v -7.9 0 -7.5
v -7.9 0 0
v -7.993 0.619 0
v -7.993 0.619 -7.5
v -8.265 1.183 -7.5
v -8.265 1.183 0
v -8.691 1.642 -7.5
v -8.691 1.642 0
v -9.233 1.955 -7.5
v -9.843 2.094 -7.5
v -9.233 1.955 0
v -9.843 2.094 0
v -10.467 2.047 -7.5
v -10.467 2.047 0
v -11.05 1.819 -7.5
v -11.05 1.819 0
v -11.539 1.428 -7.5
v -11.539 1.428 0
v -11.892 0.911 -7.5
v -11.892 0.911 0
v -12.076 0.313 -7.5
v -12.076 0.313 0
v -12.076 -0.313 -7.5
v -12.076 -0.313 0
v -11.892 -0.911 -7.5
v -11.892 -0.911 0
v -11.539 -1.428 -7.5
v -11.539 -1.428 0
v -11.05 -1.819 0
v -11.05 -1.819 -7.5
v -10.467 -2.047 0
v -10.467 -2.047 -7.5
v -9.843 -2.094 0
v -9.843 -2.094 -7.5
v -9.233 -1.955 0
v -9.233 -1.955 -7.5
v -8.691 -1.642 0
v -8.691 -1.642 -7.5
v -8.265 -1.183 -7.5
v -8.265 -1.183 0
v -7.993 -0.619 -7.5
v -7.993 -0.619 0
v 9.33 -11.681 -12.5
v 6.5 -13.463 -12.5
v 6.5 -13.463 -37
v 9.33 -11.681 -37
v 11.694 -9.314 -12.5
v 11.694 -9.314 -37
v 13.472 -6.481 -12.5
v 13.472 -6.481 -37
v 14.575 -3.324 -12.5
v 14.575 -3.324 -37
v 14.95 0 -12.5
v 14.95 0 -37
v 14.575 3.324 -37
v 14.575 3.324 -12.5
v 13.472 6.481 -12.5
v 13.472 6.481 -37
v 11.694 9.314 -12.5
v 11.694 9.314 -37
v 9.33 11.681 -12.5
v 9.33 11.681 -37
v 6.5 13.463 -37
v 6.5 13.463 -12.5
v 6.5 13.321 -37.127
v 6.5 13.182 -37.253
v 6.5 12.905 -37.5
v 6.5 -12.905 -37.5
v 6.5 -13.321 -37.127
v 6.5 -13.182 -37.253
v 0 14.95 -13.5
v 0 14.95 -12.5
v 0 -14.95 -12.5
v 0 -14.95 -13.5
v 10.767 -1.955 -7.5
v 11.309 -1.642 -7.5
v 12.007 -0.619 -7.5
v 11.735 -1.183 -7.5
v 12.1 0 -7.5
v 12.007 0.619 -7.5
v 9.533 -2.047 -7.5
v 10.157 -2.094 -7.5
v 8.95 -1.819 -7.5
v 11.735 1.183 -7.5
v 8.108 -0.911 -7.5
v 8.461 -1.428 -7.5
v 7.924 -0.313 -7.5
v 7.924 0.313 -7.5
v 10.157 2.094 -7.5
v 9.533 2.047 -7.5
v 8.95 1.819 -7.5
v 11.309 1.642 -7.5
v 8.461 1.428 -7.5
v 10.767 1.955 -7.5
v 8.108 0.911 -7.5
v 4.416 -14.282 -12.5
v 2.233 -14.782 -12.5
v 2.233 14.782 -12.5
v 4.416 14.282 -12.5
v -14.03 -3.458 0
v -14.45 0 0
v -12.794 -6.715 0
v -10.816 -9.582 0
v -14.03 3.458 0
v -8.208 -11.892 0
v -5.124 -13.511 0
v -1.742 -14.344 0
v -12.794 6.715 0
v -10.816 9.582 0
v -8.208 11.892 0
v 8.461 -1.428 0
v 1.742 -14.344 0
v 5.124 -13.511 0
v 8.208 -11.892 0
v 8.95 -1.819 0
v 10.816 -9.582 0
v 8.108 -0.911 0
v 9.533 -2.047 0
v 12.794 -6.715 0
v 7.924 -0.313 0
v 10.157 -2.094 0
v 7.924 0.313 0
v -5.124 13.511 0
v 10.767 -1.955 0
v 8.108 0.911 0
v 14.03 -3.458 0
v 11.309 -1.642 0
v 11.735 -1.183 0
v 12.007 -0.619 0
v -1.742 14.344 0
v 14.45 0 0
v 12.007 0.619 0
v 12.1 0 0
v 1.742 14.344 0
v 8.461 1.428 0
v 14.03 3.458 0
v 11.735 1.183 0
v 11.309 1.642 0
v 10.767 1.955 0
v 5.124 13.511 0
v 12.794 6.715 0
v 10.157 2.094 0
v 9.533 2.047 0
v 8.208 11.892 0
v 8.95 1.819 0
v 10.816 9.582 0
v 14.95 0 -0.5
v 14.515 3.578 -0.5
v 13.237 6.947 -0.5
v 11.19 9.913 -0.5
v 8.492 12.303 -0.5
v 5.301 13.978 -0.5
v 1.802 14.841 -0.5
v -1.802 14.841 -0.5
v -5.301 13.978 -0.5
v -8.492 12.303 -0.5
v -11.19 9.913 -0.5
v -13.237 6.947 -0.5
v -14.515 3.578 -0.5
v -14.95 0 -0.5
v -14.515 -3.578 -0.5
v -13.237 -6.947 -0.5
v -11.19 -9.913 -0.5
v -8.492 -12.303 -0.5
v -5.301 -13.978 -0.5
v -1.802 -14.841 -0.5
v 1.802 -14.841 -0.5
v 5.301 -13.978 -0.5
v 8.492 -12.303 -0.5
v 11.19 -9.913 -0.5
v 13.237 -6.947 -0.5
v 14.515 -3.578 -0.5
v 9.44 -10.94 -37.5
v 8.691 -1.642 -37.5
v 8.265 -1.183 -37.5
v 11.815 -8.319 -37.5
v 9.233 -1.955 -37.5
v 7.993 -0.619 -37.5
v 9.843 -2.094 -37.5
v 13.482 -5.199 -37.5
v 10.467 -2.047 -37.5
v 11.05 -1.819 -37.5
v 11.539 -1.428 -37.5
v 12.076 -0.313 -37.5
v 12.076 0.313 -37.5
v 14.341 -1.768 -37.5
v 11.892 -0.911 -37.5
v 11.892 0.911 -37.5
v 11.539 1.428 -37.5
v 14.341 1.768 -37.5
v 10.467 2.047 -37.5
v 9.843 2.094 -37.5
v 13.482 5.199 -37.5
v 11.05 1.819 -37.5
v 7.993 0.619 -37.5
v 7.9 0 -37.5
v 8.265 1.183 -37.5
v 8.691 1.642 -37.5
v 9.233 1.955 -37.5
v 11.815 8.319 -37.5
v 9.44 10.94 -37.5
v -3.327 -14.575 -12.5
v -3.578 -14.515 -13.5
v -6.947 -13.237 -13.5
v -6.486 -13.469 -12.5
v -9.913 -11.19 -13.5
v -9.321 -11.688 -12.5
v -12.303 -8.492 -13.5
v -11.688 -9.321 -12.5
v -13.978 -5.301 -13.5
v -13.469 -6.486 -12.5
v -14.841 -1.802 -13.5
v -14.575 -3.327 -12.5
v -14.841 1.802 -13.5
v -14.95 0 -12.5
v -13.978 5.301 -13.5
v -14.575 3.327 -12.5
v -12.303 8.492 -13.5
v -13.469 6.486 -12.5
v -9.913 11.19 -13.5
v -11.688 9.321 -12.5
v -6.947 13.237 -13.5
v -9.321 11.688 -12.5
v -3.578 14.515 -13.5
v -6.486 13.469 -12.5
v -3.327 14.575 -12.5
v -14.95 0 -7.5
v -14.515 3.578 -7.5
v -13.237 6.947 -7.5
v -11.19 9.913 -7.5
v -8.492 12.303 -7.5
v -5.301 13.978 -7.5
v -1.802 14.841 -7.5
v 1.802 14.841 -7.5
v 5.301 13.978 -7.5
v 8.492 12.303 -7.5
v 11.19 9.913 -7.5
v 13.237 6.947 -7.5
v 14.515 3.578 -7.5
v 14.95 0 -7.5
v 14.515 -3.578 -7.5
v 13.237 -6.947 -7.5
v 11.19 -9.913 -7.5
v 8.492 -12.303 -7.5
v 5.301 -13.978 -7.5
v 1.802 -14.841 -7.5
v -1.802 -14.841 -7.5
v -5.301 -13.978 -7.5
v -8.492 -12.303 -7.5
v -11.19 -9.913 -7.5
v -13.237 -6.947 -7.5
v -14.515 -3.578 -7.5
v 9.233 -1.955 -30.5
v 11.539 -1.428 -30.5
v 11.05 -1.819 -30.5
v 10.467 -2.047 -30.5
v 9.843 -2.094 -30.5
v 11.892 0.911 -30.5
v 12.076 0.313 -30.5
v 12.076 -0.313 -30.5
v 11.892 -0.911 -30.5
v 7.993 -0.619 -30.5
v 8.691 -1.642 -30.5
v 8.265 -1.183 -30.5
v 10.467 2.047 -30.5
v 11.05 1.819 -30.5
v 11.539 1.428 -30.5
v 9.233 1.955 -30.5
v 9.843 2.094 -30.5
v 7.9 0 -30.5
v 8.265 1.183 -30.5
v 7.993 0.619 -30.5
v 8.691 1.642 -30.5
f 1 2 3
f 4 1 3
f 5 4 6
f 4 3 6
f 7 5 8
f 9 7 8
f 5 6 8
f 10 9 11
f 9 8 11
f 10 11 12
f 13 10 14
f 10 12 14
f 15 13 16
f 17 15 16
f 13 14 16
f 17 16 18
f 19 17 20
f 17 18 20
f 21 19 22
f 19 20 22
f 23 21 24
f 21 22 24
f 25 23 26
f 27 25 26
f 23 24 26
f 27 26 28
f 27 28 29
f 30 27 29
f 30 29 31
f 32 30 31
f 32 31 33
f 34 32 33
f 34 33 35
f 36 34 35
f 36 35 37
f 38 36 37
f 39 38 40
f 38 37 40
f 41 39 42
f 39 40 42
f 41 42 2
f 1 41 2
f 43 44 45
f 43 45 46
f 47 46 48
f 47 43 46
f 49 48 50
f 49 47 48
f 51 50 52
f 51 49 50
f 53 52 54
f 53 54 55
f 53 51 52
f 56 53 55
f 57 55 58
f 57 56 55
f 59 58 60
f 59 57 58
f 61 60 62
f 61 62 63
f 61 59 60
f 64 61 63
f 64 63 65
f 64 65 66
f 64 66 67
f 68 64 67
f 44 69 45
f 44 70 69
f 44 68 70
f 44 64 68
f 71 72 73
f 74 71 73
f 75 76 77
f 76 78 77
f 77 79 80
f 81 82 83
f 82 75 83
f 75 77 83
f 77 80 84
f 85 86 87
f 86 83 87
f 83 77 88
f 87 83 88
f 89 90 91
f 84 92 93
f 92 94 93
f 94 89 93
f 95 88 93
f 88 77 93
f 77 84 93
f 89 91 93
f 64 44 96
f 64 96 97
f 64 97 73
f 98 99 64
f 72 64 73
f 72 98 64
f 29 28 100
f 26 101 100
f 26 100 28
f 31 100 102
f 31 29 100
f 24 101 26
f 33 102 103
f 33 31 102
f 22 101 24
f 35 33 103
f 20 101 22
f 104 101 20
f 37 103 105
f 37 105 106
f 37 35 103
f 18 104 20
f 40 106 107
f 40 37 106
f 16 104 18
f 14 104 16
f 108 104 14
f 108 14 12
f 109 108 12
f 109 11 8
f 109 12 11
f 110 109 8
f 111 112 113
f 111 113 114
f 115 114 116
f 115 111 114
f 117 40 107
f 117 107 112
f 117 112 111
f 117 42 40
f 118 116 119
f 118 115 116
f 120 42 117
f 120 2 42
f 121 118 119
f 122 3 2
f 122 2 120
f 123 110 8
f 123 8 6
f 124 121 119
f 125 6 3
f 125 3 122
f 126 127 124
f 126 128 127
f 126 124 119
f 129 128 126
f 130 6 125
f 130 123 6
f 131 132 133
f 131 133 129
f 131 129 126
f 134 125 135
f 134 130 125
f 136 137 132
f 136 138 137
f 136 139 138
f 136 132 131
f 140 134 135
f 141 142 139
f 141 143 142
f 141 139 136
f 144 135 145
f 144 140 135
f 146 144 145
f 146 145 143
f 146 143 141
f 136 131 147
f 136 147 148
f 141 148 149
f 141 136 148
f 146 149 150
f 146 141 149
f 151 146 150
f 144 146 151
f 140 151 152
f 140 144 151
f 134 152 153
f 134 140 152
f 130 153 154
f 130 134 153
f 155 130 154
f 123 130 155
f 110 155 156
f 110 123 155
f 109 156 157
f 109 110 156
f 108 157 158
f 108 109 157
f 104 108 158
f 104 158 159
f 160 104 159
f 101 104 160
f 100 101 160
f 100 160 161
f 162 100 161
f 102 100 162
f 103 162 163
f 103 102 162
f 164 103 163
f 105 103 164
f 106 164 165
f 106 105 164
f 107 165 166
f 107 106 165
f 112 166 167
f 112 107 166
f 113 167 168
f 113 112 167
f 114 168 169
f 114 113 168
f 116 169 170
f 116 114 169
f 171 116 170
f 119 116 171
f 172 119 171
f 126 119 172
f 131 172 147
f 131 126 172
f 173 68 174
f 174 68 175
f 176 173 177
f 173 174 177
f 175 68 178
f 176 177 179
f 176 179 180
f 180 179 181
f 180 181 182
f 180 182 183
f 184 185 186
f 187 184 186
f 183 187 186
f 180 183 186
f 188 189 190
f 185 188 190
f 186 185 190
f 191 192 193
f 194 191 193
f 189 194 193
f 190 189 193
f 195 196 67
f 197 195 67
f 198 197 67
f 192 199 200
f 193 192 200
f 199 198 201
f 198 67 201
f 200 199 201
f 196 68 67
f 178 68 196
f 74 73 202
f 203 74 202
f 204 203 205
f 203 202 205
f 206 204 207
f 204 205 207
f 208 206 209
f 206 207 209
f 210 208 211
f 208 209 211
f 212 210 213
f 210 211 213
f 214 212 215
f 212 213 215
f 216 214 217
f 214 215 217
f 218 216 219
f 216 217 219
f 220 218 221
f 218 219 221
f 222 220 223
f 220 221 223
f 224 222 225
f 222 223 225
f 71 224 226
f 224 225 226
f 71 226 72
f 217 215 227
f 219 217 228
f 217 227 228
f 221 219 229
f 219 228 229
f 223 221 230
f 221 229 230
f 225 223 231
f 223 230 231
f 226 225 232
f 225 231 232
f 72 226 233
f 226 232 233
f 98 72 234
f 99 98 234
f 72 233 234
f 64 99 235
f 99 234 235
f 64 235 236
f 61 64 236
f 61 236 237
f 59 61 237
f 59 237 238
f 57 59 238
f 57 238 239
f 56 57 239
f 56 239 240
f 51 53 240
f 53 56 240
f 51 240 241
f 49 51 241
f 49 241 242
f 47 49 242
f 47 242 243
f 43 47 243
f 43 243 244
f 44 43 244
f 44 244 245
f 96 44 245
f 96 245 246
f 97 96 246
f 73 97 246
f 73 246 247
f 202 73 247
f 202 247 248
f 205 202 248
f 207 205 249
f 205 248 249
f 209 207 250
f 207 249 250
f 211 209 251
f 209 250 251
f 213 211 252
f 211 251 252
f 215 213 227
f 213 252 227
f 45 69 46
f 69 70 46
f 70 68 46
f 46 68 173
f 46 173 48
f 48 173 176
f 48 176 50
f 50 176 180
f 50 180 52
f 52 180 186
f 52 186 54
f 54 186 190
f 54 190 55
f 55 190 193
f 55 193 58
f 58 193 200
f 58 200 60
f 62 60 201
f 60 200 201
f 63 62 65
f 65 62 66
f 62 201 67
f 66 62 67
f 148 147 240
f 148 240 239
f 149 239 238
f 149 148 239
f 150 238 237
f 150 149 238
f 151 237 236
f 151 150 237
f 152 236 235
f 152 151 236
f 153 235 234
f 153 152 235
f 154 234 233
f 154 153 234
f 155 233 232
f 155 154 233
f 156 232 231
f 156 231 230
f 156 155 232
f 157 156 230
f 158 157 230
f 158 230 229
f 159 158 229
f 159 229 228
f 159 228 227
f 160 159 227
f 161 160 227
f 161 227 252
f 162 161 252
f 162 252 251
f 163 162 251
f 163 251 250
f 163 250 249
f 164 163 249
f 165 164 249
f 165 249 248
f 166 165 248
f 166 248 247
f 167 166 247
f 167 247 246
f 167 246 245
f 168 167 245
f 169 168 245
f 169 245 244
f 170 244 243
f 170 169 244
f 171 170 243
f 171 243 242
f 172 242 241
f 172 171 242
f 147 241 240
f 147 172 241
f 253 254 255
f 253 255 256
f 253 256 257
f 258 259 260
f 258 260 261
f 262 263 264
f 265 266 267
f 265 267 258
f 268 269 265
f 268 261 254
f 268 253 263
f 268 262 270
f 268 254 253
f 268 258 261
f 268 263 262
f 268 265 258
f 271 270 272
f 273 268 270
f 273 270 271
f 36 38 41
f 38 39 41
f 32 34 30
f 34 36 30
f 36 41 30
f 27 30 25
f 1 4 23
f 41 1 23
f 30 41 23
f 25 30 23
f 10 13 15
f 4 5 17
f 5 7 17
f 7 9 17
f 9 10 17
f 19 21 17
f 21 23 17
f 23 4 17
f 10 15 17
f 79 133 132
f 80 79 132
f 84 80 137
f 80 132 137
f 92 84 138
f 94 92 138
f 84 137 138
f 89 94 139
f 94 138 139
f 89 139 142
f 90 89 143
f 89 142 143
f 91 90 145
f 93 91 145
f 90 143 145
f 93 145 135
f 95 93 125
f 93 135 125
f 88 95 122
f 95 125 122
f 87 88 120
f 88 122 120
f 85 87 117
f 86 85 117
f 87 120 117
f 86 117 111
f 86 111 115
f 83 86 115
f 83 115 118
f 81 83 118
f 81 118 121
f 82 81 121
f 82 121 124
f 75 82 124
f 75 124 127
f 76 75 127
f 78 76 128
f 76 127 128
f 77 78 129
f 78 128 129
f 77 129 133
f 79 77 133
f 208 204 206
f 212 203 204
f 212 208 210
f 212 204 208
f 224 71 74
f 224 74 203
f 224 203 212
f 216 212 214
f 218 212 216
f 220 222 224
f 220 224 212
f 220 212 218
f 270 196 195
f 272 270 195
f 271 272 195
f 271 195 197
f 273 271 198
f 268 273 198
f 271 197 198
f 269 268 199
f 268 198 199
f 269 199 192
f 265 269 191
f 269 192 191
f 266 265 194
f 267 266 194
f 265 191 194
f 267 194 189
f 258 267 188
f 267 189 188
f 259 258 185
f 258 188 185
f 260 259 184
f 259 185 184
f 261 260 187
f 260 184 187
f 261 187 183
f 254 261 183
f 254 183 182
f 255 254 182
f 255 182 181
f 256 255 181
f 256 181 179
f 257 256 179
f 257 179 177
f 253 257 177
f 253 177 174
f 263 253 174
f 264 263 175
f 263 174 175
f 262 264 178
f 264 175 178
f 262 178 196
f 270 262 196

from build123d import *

# Parameters (mm, degrees)
SKETCH1_R           = 14.949572774
SKETCH1_R_2         = 2.099903903
BOSS_EXTRUDE1_DEPTH = 7.5
SKETCH2_R           = 14.949572774
BOSS_EXTRUDE2_DEPTH = 5
BOSS_EXTRUDE3_DEPTH = 1
BOSS_EXTRUDE4_DEPTH = 25
SKETCH5_R           = 2.099903903
CUT_EXTRUDE1_DEPTH  = 7
CHAMFER2_SIZE       = 0.5
CHAMFER3_SIZE       = 0.5


with BuildPart() as part:
    # Sketch1 → Boss-Extrude1 (new body)
    with BuildSketch(Plane.XY):
        Circle(SKETCH1_R)
        with Locations((9.999999776, -1e-09)):
            Circle(SKETCH1_R_2, mode=Mode.SUBTRACT)
        with Locations((-9.999999776, 1e-09)):
            Circle(SKETCH1_R_2, mode=Mode.SUBTRACT)
    extrude(amount=-BOSS_EXTRUDE1_DEPTH)

    # Sketch2 → Boss-Extrude2 (add)
    with BuildSketch(Plane(origin=(0, 0, -7.5), x_dir=(-1, 0, 0), z_dir=(0, 0, -1))):
        Circle(SKETCH2_R)
    extrude(amount=BOSS_EXTRUDE2_DEPTH)

    # Sketch3 → Boss-Extrude3 (add)
    with BuildSketch(Plane(origin=(0, 0, -12.5), x_dir=(-1, 0, 0), z_dir=(0, 0, -1))):
        with BuildLine():
            Line((-1e-09, 14.949572774), (-1e-09, -14.949572774))
            ThreePointArc((-1e-09, -14.949572774), (14.949572774, 0), (-1e-09, 14.949572774))
        make_face()
    extrude(amount=BOSS_EXTRUDE3_DEPTH)

    # Sketch4 → Boss-Extrude4 (add)
    with BuildSketch(Plane(origin=(0, 0, -12.5), x_dir=(-1, 0, 0), z_dir=(0, 0, -1))):
        with BuildLine():
            Line((-6.499816063, 13.462619257), (-6.499816063, -13.462619257))
            ThreePointArc((-6.499816063, -13.462619257), (-14.949572774, 0), (-6.499816063, 13.462619257))
        make_face()
    extrude(amount=BOSS_EXTRUDE4_DEPTH)

    # Sketch5 → Cut-Extrude1 (cut)
    with BuildSketch(Plane(origin=(0, 0, -37.5), x_dir=(-1, 0, 0), z_dir=(0, 0, -1))):
        with Locations((-9.999999776, -1e-09)):
            Circle(SKETCH5_R)
    extrude(amount=-CUT_EXTRUDE1_DEPTH, mode=Mode.SUBTRACT)

    # Chamfer2
    chamfer2_edges = [part.edges().sort_by_distance(p)[0] for p in [
        (14.949572774, 0, -37.5),
    ]]
    chamfer(chamfer2_edges, length=CHAMFER2_SIZE)

    # Chamfer3
    chamfer3_edges = [part.edges().sort_by_distance(p)[0] for p in [
        (-14.949572774, 0, 0),
    ]]
    chamfer(chamfer3_edges, length=CHAMFER3_SIZE)


solid = part.part
